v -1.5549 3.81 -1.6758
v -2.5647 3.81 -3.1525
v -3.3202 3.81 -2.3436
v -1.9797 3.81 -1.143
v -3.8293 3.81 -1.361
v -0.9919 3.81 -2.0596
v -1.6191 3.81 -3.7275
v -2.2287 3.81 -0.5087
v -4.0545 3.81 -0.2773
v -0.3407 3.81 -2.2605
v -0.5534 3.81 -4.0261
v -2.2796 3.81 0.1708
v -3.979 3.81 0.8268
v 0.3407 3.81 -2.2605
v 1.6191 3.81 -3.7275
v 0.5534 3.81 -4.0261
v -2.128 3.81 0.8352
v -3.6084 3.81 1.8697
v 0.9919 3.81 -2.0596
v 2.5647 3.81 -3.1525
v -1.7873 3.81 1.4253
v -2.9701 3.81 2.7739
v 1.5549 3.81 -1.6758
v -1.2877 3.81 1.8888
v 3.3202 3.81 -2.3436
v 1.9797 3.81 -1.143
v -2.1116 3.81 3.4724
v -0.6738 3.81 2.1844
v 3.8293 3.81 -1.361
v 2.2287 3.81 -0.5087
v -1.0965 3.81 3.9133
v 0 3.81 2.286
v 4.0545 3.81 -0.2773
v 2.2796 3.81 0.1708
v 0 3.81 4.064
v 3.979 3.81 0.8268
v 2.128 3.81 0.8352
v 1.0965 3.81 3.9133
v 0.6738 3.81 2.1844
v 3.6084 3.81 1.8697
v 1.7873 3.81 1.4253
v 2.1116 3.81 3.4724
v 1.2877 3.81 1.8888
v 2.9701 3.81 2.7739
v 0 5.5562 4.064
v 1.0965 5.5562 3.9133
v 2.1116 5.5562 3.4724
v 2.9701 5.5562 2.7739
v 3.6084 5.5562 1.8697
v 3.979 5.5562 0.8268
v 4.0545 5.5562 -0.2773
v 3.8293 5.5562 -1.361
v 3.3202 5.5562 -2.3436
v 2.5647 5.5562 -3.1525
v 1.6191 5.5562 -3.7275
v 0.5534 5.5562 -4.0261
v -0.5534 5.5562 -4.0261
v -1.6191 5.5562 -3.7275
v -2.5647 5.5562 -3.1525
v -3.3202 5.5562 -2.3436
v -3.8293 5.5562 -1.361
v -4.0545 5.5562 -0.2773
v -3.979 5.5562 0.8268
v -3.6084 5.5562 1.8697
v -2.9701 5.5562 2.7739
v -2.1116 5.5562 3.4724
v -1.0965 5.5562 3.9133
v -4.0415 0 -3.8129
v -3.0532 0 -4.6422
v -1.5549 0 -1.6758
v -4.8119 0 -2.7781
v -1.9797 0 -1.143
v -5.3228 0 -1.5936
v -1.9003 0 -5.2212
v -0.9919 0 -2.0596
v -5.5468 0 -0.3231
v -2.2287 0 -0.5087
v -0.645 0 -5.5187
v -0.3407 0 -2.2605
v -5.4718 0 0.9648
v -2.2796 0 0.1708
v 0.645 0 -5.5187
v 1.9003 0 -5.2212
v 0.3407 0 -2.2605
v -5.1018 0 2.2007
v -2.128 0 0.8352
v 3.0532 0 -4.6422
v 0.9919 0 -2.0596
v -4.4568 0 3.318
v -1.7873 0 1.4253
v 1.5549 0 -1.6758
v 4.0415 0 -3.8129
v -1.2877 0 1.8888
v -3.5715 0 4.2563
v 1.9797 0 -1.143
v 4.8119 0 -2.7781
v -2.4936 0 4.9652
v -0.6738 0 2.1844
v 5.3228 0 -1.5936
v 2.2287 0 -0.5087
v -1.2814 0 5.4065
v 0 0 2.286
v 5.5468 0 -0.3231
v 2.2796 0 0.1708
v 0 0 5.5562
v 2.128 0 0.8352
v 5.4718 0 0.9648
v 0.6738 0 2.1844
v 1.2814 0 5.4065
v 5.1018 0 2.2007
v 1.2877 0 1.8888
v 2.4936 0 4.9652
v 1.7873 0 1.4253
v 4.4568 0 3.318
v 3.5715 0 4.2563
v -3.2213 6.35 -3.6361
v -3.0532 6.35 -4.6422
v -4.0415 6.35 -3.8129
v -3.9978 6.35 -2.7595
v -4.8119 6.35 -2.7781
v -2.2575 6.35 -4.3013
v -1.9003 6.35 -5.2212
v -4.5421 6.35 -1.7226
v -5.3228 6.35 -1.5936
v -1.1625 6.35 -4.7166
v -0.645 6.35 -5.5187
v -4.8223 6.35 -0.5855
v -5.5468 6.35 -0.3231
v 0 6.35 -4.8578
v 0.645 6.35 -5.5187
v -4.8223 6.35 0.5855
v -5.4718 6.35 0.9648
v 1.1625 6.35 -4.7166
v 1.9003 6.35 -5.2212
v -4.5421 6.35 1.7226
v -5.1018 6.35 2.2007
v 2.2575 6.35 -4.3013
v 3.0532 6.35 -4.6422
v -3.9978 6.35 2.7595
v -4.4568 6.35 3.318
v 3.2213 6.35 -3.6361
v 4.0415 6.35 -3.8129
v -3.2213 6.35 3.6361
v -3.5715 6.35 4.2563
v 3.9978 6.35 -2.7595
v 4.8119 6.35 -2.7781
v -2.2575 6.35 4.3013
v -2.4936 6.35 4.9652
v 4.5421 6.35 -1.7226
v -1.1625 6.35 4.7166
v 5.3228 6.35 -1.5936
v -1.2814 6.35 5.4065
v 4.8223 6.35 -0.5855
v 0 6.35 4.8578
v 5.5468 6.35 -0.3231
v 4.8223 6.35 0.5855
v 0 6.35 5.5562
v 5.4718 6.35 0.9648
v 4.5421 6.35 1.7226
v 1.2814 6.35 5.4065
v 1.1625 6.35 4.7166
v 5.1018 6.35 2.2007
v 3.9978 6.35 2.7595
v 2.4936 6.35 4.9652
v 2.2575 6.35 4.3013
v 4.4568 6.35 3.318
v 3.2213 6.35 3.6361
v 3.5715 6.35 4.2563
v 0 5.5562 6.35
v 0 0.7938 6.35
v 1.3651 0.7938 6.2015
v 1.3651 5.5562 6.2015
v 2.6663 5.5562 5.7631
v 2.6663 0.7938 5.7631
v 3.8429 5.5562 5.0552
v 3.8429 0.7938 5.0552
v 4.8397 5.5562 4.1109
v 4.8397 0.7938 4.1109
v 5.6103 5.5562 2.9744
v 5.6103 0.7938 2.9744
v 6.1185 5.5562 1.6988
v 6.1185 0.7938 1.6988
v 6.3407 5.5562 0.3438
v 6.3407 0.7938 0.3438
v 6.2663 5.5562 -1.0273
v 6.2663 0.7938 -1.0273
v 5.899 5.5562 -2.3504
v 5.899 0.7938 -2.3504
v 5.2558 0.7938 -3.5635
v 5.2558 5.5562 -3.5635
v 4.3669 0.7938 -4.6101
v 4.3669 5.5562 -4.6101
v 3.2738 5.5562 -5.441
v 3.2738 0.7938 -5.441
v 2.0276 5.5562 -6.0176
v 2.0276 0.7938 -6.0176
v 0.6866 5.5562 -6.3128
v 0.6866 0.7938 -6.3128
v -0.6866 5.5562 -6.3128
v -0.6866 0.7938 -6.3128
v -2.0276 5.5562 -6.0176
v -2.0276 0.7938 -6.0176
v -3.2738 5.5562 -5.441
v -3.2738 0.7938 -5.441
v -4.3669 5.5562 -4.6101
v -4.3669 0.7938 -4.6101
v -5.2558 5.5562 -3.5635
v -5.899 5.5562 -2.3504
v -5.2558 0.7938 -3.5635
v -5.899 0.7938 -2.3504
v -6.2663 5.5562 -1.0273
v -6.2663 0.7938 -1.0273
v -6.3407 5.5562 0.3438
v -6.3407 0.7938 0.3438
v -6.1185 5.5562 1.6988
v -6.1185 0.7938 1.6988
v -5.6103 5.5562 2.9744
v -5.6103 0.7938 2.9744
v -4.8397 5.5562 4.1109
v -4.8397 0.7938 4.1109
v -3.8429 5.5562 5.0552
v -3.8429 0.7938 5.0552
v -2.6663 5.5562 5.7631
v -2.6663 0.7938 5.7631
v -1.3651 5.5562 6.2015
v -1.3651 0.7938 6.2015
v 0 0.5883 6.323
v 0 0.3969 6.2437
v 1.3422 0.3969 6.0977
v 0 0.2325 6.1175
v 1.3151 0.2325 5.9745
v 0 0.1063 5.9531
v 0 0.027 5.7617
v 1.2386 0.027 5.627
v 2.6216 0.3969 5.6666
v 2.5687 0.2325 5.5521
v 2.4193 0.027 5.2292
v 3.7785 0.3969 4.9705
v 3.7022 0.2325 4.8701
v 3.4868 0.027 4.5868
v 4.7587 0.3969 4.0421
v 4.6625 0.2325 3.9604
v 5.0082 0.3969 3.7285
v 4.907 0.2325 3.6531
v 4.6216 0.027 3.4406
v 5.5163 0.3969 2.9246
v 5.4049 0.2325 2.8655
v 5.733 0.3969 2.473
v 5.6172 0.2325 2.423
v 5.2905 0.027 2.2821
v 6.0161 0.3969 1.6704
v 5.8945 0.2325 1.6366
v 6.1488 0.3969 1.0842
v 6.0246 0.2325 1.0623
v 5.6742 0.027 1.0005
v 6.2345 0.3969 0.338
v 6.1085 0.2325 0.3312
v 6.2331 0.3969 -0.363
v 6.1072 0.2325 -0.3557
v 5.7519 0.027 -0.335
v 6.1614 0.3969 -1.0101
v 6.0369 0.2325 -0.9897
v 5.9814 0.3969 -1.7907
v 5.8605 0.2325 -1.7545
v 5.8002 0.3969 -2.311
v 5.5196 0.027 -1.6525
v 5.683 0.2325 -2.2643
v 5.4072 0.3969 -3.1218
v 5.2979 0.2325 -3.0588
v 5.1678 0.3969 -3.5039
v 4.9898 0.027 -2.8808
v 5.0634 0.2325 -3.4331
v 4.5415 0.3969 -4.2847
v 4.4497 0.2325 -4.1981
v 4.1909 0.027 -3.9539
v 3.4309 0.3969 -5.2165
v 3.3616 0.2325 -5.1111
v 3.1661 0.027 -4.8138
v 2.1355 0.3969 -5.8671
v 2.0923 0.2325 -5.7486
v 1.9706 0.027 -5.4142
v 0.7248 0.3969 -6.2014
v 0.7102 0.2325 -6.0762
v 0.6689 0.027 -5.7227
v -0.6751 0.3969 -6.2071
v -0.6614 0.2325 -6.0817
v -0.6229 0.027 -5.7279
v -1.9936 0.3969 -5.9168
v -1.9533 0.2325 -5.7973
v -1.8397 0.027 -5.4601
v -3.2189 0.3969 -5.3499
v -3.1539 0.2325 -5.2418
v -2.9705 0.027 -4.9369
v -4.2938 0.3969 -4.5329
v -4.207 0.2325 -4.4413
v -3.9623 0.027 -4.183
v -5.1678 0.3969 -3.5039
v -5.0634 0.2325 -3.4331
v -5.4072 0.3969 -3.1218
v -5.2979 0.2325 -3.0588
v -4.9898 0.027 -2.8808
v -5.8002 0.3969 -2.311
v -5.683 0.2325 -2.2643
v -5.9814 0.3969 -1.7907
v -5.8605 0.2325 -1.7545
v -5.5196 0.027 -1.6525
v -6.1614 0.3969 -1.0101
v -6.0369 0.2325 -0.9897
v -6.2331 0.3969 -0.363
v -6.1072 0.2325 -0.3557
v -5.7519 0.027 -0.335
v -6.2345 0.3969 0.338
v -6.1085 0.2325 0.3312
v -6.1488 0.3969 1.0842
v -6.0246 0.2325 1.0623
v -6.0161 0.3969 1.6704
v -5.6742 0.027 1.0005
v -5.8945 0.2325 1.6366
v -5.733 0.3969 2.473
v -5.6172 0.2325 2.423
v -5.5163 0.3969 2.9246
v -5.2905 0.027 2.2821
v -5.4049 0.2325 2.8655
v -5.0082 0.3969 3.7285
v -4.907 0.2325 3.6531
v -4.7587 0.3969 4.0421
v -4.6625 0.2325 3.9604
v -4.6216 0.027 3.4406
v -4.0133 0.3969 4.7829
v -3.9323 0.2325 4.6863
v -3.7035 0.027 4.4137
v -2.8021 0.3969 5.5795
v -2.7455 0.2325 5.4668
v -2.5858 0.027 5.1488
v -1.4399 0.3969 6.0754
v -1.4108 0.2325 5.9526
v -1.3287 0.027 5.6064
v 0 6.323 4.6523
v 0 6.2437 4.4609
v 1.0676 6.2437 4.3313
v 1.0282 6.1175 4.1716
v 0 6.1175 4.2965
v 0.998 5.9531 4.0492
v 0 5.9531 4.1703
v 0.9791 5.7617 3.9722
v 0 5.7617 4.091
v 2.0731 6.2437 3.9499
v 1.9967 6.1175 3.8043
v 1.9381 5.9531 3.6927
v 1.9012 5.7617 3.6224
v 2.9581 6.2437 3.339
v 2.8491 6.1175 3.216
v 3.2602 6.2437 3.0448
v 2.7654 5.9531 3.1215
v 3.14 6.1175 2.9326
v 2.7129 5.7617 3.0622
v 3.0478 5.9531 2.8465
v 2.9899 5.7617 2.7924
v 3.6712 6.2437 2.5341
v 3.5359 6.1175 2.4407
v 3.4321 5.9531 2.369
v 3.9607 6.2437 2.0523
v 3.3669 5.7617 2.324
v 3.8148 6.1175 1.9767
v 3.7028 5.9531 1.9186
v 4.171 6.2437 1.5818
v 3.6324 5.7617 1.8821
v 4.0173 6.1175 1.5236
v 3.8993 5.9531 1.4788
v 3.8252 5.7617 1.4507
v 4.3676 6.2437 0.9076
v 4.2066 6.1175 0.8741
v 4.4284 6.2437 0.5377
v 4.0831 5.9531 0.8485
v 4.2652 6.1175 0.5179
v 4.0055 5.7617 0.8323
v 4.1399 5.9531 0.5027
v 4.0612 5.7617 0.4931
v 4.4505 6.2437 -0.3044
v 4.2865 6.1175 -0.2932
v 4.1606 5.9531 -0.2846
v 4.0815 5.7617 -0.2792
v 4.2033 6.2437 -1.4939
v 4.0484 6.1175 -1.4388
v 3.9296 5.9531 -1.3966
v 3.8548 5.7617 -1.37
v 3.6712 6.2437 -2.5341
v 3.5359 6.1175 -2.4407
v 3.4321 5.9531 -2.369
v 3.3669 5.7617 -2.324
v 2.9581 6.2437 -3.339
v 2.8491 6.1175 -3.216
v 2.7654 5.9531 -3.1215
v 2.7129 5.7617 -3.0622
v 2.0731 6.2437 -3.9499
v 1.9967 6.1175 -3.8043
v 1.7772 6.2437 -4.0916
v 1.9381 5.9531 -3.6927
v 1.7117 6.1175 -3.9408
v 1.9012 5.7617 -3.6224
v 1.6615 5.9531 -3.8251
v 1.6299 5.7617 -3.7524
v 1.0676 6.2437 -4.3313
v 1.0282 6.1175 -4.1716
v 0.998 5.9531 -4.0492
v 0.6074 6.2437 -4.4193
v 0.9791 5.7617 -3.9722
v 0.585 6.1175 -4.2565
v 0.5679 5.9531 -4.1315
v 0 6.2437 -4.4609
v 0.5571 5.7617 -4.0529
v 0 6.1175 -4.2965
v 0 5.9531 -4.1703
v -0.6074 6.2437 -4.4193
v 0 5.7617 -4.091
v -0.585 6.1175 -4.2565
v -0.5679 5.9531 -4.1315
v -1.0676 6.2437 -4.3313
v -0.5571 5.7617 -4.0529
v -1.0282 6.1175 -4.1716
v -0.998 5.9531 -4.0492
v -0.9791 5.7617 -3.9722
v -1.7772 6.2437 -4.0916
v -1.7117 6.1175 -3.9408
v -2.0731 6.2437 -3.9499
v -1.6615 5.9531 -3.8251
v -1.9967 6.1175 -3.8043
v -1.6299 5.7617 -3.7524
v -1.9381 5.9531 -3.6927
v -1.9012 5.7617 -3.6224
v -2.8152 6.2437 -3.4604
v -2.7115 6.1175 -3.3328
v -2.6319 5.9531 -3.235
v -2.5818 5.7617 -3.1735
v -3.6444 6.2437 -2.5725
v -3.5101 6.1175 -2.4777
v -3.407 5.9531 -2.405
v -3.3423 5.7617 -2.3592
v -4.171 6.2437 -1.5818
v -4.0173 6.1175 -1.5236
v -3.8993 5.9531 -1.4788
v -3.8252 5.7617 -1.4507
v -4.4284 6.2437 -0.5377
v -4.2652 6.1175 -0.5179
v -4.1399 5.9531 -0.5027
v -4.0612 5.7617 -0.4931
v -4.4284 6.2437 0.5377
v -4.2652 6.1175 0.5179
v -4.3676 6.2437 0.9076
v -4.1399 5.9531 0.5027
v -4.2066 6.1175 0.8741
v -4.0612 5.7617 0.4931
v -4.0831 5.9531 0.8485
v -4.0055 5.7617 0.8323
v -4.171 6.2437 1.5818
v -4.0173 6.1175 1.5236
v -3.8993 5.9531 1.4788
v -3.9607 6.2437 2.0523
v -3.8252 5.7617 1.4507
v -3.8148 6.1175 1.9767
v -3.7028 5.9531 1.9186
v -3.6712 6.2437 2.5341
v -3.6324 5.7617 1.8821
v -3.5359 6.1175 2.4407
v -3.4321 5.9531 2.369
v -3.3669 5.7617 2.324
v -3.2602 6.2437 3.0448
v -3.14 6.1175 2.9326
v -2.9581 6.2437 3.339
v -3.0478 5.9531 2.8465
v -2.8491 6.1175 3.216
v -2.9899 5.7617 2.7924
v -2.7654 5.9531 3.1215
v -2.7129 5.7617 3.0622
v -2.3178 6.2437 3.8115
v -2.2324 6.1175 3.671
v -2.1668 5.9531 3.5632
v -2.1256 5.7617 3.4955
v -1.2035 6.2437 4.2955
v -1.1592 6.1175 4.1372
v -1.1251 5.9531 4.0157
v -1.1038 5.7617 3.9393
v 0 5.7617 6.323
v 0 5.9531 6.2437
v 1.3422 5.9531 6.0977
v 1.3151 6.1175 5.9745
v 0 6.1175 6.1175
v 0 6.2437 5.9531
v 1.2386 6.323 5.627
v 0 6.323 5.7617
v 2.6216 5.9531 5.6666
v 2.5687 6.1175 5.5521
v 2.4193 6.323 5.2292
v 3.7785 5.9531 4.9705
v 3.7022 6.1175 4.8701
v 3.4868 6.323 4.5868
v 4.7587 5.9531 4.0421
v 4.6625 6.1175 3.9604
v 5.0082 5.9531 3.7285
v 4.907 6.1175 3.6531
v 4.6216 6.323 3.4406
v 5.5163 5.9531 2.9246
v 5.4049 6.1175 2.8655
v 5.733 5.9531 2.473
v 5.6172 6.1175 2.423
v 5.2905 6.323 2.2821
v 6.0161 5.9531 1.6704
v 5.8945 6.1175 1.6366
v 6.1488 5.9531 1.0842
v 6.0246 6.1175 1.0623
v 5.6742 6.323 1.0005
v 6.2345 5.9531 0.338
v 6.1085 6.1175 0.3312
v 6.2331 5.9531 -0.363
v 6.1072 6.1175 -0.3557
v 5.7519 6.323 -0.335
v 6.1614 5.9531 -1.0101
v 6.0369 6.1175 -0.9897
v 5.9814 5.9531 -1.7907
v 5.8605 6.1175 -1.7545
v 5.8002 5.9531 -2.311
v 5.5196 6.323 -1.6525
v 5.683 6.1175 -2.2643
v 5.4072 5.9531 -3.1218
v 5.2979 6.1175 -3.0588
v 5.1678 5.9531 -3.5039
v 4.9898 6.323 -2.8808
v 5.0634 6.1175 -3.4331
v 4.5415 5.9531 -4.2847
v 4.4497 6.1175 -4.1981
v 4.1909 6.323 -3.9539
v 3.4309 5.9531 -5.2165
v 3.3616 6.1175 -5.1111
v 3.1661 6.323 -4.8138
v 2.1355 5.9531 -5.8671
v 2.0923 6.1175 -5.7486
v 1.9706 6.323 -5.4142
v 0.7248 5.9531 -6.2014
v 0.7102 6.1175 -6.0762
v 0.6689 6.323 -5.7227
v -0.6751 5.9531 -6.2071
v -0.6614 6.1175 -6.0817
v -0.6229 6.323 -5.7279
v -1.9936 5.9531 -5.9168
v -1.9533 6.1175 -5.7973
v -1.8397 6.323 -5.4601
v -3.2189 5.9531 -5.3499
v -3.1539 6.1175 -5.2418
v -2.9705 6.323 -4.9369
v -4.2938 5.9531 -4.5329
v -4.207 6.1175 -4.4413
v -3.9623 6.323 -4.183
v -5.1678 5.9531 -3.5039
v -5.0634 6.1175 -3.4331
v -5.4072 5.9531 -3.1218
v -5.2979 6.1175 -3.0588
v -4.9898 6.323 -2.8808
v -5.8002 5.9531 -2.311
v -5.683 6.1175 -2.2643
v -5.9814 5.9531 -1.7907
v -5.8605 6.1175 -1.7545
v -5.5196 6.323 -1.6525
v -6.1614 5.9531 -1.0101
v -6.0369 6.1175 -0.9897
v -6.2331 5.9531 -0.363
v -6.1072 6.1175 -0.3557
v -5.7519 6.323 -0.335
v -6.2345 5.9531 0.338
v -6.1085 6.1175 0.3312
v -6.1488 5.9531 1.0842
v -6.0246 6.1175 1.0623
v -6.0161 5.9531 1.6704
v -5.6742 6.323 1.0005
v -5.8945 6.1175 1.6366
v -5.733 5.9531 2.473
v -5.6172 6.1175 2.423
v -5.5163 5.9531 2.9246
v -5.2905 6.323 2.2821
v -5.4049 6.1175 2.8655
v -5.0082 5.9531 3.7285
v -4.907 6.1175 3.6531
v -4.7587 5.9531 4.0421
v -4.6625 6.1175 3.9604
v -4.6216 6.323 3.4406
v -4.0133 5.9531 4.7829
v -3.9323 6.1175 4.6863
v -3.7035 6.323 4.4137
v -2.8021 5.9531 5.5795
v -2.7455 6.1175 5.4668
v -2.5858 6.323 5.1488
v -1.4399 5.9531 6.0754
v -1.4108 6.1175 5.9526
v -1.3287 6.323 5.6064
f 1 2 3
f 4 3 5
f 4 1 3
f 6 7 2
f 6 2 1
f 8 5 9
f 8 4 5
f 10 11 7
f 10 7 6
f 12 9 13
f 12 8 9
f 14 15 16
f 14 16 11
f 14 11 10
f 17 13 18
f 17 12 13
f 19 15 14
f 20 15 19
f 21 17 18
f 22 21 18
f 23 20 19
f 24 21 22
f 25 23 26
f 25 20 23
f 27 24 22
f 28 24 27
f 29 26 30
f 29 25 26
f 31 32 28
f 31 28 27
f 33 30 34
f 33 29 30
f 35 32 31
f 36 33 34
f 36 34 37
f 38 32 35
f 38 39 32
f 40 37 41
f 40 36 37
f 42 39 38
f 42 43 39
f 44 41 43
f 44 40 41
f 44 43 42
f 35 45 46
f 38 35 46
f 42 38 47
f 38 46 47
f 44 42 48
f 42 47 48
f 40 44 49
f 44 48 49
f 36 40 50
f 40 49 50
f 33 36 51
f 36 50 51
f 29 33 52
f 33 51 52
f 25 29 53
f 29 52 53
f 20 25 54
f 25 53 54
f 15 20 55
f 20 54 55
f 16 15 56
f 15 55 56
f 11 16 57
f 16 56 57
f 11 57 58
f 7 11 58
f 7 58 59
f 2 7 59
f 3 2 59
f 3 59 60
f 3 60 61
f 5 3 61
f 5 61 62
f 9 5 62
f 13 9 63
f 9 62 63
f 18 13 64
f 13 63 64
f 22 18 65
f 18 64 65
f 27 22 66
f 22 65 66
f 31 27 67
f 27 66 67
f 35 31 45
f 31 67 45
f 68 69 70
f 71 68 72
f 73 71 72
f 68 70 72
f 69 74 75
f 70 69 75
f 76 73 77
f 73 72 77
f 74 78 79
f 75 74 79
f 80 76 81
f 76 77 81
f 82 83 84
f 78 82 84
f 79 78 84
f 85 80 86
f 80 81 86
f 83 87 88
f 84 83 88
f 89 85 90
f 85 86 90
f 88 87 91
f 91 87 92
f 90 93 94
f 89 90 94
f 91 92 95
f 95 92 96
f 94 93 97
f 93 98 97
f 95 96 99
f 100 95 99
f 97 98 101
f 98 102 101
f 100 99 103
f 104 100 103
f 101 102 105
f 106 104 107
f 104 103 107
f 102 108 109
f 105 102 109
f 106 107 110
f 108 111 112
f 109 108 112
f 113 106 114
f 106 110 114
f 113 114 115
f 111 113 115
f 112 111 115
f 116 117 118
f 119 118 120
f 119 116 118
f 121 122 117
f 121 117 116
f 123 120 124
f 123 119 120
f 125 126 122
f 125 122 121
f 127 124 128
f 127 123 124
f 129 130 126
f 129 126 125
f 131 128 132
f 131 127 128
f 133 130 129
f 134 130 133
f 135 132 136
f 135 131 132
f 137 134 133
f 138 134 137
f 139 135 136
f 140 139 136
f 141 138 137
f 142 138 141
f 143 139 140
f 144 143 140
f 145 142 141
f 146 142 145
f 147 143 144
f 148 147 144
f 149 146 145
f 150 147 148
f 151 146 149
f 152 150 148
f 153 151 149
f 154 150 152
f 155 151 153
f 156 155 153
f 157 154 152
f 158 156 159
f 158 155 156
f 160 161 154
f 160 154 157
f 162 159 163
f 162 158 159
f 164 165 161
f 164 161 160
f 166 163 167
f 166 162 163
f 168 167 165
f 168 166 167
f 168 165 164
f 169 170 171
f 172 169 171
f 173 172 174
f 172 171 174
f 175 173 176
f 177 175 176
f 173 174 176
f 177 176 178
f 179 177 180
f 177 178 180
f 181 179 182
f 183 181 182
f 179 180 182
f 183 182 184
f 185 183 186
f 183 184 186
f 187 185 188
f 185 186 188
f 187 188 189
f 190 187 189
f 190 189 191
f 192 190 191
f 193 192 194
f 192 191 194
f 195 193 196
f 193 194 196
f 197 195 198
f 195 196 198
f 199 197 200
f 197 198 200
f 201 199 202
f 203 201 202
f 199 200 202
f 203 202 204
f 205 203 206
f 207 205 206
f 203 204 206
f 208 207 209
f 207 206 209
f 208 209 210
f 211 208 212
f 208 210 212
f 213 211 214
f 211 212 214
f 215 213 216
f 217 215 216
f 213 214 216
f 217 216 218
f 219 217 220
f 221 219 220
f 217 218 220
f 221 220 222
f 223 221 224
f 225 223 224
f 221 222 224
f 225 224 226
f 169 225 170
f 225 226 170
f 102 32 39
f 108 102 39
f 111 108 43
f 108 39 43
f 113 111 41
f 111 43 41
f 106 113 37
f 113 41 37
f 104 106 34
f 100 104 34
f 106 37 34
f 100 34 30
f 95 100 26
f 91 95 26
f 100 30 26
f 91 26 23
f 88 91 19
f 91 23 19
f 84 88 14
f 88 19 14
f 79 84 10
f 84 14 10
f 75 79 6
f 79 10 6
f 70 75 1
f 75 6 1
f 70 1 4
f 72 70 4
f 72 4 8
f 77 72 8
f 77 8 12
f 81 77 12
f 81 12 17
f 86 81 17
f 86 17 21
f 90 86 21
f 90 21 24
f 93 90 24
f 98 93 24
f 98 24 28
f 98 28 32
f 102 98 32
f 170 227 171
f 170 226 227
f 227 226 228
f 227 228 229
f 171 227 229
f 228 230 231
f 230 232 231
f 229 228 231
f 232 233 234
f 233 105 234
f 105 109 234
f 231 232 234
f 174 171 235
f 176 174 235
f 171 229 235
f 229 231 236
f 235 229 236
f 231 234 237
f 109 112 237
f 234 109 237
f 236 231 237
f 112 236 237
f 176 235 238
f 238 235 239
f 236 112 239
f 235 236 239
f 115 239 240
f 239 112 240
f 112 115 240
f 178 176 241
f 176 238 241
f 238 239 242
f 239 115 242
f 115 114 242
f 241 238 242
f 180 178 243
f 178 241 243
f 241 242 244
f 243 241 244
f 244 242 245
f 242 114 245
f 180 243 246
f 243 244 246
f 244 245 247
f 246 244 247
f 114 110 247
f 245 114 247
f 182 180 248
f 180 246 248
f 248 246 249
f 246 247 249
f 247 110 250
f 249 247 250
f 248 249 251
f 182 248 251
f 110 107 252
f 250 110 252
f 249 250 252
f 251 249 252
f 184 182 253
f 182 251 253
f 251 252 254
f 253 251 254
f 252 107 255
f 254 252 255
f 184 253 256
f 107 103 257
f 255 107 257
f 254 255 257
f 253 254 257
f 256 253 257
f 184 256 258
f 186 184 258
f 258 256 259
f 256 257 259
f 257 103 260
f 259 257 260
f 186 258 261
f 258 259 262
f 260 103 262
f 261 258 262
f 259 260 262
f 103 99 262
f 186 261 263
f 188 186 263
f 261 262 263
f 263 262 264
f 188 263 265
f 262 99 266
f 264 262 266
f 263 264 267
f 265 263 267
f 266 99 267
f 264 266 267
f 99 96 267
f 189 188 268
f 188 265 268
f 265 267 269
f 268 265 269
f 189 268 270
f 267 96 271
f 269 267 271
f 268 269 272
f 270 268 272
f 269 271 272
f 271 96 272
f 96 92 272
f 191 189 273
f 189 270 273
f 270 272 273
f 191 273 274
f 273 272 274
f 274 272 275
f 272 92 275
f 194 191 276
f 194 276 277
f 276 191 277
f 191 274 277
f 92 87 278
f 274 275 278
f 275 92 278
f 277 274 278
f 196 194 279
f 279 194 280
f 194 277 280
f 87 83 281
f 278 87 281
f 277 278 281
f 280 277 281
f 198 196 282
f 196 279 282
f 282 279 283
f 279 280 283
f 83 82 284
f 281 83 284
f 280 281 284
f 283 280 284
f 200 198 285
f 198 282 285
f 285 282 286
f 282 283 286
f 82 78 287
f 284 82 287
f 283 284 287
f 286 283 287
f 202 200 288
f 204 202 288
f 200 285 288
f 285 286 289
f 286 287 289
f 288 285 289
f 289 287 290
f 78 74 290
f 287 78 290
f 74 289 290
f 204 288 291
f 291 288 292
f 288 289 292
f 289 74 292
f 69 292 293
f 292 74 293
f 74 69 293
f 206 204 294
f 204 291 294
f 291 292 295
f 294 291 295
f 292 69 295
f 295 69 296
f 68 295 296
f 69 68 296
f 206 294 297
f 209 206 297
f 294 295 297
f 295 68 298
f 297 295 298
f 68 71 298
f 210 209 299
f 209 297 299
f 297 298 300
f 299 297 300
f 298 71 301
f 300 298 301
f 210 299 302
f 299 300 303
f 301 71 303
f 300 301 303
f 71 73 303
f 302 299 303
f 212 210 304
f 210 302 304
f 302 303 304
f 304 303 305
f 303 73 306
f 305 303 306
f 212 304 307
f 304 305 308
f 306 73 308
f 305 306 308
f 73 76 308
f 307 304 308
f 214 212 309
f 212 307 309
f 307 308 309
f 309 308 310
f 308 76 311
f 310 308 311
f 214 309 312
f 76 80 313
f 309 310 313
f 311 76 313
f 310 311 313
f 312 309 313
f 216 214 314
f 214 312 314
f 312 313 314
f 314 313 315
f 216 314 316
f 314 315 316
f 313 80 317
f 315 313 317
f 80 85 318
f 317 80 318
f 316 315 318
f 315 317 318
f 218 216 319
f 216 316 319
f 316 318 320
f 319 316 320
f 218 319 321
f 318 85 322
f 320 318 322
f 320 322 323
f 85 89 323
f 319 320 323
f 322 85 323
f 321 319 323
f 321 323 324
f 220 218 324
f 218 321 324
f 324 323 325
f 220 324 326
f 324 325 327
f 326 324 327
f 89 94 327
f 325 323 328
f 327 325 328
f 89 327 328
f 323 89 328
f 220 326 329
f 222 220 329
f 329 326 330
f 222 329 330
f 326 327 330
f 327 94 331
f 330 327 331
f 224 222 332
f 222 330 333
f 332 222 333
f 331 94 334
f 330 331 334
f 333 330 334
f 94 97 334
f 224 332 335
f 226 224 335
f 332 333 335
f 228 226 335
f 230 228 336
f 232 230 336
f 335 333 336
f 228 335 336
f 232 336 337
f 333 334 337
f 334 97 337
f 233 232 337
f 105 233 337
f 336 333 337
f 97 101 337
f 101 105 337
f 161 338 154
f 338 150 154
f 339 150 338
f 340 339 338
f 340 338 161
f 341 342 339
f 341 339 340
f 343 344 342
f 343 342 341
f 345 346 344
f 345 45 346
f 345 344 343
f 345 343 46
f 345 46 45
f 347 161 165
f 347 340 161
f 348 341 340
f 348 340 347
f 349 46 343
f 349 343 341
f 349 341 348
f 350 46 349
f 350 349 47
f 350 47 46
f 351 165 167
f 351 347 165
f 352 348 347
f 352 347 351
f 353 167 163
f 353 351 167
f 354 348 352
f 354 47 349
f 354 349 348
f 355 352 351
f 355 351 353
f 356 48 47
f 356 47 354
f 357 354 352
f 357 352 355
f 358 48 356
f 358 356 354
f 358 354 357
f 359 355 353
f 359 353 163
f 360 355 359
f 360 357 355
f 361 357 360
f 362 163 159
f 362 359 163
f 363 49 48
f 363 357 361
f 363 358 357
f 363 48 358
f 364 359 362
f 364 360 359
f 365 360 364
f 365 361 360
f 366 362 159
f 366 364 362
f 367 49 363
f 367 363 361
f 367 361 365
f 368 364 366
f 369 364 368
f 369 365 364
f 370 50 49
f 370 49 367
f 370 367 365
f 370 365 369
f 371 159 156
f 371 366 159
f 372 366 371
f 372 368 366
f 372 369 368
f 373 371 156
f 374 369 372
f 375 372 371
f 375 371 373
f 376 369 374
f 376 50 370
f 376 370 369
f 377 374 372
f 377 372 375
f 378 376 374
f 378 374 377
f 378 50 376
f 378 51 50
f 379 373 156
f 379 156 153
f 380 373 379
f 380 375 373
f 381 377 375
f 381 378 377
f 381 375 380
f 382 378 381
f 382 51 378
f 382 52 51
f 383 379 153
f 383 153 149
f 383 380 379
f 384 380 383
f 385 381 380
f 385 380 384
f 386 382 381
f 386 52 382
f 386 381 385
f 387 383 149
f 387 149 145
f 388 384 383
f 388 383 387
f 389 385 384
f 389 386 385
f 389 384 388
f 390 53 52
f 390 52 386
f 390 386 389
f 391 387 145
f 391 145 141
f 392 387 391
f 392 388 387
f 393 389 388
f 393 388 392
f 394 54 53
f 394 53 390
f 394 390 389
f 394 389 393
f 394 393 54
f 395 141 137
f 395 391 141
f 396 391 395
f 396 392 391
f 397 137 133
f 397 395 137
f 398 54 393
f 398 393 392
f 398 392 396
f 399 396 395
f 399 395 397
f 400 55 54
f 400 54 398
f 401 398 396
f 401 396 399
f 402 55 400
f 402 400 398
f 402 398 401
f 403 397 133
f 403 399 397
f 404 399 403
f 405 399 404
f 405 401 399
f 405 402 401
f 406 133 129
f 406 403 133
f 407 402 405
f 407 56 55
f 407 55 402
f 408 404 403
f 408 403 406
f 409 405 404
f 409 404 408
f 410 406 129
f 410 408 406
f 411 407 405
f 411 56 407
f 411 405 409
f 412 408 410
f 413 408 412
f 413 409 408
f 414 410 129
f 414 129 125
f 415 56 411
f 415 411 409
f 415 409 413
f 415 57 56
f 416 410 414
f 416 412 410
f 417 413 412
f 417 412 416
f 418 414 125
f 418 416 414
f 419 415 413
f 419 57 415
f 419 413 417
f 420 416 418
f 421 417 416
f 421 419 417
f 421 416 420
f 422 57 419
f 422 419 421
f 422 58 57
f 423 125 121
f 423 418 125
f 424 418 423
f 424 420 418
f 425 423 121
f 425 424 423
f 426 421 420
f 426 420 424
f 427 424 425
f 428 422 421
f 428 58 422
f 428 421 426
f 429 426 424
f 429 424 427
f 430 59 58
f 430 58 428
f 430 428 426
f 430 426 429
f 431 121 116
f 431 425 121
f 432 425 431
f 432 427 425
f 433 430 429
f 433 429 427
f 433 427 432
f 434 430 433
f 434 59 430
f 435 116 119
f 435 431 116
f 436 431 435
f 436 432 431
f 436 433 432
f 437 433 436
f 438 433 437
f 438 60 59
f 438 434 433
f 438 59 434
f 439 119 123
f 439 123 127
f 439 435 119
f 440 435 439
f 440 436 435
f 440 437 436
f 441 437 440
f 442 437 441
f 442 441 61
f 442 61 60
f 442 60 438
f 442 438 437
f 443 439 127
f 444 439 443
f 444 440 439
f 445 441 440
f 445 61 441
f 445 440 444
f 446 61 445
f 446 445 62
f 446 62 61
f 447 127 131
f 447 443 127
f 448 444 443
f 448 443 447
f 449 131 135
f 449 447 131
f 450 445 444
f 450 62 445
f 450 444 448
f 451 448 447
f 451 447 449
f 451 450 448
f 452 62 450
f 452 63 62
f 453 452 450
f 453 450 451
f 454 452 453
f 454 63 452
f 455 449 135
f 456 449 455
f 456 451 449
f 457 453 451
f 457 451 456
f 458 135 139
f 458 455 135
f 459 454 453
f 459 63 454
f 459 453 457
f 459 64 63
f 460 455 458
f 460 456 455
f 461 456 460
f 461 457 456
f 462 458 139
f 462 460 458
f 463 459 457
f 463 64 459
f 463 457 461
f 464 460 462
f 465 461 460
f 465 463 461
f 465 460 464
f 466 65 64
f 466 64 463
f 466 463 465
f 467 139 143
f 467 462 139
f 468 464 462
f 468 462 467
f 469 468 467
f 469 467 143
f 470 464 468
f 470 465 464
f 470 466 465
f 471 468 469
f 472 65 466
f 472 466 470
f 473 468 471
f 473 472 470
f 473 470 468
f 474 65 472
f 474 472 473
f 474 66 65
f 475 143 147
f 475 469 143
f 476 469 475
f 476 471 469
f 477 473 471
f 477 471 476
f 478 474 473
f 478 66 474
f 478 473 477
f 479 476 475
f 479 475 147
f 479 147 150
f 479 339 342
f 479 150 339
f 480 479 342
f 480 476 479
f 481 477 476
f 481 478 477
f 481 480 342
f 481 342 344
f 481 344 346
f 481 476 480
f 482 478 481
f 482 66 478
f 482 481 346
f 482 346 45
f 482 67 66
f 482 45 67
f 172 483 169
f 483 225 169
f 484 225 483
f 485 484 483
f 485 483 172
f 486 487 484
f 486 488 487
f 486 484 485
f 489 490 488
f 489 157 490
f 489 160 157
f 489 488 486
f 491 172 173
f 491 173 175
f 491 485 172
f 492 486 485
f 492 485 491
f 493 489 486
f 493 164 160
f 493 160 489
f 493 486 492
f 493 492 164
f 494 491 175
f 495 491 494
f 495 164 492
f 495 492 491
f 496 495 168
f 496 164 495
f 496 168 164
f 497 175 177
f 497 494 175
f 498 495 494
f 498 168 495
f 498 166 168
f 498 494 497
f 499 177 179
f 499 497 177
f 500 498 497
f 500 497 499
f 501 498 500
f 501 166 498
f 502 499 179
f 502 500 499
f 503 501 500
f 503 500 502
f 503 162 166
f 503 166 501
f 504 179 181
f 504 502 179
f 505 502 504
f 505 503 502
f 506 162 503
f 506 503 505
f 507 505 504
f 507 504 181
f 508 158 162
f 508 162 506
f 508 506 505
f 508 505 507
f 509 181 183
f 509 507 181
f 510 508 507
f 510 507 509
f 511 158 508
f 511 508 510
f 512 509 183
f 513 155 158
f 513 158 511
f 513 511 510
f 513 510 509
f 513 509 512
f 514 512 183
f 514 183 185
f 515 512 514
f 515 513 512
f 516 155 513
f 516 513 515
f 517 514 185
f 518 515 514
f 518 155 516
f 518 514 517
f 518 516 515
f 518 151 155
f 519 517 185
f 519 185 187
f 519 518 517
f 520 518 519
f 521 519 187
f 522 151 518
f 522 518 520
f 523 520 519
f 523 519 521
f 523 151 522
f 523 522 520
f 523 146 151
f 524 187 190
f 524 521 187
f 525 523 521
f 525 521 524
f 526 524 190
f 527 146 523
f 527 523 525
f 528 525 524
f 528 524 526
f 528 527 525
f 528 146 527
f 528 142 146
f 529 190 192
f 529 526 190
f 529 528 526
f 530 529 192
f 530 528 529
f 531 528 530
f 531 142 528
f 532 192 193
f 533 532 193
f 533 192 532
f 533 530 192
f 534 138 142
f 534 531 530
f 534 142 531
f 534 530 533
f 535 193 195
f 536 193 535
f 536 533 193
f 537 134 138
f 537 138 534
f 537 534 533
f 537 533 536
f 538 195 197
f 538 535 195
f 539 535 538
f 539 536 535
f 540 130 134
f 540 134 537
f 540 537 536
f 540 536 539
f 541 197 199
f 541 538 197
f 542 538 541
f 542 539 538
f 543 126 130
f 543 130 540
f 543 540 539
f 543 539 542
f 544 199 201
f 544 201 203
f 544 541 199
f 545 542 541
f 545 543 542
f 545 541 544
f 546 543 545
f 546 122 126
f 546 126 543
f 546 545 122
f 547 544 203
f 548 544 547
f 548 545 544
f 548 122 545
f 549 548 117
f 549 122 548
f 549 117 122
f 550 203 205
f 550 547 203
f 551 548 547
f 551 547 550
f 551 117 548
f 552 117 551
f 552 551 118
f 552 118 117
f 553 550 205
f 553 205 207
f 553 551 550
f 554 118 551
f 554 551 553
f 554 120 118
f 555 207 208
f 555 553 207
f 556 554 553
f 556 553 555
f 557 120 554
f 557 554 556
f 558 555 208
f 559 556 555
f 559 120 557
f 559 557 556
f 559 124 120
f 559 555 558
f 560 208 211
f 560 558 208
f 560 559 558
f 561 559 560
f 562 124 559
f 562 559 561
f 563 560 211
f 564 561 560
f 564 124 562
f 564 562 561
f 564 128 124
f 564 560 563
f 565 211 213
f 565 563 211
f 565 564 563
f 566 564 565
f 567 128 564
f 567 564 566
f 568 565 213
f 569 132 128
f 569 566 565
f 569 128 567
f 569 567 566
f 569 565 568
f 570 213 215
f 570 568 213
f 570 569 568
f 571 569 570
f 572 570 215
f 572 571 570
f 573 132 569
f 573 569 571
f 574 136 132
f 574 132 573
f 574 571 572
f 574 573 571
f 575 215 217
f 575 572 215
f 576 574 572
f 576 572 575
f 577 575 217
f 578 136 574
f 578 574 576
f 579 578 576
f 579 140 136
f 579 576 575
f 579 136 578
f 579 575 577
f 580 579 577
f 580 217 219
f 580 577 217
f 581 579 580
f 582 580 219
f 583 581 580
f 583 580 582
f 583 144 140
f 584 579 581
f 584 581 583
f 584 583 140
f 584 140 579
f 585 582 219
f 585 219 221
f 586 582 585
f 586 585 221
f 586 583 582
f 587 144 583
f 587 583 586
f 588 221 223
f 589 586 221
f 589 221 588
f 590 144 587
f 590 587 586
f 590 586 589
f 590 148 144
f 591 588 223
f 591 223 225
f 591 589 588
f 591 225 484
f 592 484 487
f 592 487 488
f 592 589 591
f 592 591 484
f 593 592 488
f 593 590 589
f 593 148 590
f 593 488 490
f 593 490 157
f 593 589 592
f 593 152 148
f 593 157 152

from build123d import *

# Parameters (mm, degrees)
SKETCH1_R           = 6.35
BOSS_EXTRUDE1_DEPTH = 6.35
SKETCH2_R           = 2.286
CUT_EXTRUDE1_DEPTH  = 11.998522628
SKETCH3_R           = 4.064
CUT_EXTRUDE2_DEPTH  = 2.54
FILLET1_R           = 0.79375


with BuildPart() as part:
    # Sketch1 → Boss-Extrude1 (new body)
    with BuildSketch(Plane(origin=(0, 0, 0), x_dir=(1, 0, 0), z_dir=(0, 1, 0))):
        with Locations(Location((0, 0, 0), (0, 0, 270))):
            Circle(SKETCH1_R)
    extrude(amount=BOSS_EXTRUDE1_DEPTH)

    # Sketch2 → Cut-Extrude1 (cut, through all)
    with BuildSketch(Plane(origin=(0, 6.35, 0), x_dir=(1, 0, 0), z_dir=(0, 1, 0))):
        with Locations(Location((0, 0, 0), (0, 0, 270))):
            Circle(SKETCH2_R)
    extrude(amount=-CUT_EXTRUDE1_DEPTH, mode=Mode.SUBTRACT)

    # Sketch3 → Cut-Extrude2 (cut)
    with BuildSketch(Plane(origin=(0, 6.35, 0), x_dir=(1, 0, 0), z_dir=(0, 1, 0))):
        with Locations(Location((0, 0, 0), (0, 0, 270))):
            Circle(SKETCH3_R)
    extrude(amount=-CUT_EXTRUDE2_DEPTH, mode=Mode.SUBTRACT)

    # Fillet1
    fillet1_edges = [part.edges().sort_by_distance(p)[0] for p in [
        (0, 6.35, -4.064),
        (0, 0, -6.35),
        (0, 6.35, -6.35),
    ]]
    fillet(fillet1_edges, radius=FILLET1_R)


solid = part.part
